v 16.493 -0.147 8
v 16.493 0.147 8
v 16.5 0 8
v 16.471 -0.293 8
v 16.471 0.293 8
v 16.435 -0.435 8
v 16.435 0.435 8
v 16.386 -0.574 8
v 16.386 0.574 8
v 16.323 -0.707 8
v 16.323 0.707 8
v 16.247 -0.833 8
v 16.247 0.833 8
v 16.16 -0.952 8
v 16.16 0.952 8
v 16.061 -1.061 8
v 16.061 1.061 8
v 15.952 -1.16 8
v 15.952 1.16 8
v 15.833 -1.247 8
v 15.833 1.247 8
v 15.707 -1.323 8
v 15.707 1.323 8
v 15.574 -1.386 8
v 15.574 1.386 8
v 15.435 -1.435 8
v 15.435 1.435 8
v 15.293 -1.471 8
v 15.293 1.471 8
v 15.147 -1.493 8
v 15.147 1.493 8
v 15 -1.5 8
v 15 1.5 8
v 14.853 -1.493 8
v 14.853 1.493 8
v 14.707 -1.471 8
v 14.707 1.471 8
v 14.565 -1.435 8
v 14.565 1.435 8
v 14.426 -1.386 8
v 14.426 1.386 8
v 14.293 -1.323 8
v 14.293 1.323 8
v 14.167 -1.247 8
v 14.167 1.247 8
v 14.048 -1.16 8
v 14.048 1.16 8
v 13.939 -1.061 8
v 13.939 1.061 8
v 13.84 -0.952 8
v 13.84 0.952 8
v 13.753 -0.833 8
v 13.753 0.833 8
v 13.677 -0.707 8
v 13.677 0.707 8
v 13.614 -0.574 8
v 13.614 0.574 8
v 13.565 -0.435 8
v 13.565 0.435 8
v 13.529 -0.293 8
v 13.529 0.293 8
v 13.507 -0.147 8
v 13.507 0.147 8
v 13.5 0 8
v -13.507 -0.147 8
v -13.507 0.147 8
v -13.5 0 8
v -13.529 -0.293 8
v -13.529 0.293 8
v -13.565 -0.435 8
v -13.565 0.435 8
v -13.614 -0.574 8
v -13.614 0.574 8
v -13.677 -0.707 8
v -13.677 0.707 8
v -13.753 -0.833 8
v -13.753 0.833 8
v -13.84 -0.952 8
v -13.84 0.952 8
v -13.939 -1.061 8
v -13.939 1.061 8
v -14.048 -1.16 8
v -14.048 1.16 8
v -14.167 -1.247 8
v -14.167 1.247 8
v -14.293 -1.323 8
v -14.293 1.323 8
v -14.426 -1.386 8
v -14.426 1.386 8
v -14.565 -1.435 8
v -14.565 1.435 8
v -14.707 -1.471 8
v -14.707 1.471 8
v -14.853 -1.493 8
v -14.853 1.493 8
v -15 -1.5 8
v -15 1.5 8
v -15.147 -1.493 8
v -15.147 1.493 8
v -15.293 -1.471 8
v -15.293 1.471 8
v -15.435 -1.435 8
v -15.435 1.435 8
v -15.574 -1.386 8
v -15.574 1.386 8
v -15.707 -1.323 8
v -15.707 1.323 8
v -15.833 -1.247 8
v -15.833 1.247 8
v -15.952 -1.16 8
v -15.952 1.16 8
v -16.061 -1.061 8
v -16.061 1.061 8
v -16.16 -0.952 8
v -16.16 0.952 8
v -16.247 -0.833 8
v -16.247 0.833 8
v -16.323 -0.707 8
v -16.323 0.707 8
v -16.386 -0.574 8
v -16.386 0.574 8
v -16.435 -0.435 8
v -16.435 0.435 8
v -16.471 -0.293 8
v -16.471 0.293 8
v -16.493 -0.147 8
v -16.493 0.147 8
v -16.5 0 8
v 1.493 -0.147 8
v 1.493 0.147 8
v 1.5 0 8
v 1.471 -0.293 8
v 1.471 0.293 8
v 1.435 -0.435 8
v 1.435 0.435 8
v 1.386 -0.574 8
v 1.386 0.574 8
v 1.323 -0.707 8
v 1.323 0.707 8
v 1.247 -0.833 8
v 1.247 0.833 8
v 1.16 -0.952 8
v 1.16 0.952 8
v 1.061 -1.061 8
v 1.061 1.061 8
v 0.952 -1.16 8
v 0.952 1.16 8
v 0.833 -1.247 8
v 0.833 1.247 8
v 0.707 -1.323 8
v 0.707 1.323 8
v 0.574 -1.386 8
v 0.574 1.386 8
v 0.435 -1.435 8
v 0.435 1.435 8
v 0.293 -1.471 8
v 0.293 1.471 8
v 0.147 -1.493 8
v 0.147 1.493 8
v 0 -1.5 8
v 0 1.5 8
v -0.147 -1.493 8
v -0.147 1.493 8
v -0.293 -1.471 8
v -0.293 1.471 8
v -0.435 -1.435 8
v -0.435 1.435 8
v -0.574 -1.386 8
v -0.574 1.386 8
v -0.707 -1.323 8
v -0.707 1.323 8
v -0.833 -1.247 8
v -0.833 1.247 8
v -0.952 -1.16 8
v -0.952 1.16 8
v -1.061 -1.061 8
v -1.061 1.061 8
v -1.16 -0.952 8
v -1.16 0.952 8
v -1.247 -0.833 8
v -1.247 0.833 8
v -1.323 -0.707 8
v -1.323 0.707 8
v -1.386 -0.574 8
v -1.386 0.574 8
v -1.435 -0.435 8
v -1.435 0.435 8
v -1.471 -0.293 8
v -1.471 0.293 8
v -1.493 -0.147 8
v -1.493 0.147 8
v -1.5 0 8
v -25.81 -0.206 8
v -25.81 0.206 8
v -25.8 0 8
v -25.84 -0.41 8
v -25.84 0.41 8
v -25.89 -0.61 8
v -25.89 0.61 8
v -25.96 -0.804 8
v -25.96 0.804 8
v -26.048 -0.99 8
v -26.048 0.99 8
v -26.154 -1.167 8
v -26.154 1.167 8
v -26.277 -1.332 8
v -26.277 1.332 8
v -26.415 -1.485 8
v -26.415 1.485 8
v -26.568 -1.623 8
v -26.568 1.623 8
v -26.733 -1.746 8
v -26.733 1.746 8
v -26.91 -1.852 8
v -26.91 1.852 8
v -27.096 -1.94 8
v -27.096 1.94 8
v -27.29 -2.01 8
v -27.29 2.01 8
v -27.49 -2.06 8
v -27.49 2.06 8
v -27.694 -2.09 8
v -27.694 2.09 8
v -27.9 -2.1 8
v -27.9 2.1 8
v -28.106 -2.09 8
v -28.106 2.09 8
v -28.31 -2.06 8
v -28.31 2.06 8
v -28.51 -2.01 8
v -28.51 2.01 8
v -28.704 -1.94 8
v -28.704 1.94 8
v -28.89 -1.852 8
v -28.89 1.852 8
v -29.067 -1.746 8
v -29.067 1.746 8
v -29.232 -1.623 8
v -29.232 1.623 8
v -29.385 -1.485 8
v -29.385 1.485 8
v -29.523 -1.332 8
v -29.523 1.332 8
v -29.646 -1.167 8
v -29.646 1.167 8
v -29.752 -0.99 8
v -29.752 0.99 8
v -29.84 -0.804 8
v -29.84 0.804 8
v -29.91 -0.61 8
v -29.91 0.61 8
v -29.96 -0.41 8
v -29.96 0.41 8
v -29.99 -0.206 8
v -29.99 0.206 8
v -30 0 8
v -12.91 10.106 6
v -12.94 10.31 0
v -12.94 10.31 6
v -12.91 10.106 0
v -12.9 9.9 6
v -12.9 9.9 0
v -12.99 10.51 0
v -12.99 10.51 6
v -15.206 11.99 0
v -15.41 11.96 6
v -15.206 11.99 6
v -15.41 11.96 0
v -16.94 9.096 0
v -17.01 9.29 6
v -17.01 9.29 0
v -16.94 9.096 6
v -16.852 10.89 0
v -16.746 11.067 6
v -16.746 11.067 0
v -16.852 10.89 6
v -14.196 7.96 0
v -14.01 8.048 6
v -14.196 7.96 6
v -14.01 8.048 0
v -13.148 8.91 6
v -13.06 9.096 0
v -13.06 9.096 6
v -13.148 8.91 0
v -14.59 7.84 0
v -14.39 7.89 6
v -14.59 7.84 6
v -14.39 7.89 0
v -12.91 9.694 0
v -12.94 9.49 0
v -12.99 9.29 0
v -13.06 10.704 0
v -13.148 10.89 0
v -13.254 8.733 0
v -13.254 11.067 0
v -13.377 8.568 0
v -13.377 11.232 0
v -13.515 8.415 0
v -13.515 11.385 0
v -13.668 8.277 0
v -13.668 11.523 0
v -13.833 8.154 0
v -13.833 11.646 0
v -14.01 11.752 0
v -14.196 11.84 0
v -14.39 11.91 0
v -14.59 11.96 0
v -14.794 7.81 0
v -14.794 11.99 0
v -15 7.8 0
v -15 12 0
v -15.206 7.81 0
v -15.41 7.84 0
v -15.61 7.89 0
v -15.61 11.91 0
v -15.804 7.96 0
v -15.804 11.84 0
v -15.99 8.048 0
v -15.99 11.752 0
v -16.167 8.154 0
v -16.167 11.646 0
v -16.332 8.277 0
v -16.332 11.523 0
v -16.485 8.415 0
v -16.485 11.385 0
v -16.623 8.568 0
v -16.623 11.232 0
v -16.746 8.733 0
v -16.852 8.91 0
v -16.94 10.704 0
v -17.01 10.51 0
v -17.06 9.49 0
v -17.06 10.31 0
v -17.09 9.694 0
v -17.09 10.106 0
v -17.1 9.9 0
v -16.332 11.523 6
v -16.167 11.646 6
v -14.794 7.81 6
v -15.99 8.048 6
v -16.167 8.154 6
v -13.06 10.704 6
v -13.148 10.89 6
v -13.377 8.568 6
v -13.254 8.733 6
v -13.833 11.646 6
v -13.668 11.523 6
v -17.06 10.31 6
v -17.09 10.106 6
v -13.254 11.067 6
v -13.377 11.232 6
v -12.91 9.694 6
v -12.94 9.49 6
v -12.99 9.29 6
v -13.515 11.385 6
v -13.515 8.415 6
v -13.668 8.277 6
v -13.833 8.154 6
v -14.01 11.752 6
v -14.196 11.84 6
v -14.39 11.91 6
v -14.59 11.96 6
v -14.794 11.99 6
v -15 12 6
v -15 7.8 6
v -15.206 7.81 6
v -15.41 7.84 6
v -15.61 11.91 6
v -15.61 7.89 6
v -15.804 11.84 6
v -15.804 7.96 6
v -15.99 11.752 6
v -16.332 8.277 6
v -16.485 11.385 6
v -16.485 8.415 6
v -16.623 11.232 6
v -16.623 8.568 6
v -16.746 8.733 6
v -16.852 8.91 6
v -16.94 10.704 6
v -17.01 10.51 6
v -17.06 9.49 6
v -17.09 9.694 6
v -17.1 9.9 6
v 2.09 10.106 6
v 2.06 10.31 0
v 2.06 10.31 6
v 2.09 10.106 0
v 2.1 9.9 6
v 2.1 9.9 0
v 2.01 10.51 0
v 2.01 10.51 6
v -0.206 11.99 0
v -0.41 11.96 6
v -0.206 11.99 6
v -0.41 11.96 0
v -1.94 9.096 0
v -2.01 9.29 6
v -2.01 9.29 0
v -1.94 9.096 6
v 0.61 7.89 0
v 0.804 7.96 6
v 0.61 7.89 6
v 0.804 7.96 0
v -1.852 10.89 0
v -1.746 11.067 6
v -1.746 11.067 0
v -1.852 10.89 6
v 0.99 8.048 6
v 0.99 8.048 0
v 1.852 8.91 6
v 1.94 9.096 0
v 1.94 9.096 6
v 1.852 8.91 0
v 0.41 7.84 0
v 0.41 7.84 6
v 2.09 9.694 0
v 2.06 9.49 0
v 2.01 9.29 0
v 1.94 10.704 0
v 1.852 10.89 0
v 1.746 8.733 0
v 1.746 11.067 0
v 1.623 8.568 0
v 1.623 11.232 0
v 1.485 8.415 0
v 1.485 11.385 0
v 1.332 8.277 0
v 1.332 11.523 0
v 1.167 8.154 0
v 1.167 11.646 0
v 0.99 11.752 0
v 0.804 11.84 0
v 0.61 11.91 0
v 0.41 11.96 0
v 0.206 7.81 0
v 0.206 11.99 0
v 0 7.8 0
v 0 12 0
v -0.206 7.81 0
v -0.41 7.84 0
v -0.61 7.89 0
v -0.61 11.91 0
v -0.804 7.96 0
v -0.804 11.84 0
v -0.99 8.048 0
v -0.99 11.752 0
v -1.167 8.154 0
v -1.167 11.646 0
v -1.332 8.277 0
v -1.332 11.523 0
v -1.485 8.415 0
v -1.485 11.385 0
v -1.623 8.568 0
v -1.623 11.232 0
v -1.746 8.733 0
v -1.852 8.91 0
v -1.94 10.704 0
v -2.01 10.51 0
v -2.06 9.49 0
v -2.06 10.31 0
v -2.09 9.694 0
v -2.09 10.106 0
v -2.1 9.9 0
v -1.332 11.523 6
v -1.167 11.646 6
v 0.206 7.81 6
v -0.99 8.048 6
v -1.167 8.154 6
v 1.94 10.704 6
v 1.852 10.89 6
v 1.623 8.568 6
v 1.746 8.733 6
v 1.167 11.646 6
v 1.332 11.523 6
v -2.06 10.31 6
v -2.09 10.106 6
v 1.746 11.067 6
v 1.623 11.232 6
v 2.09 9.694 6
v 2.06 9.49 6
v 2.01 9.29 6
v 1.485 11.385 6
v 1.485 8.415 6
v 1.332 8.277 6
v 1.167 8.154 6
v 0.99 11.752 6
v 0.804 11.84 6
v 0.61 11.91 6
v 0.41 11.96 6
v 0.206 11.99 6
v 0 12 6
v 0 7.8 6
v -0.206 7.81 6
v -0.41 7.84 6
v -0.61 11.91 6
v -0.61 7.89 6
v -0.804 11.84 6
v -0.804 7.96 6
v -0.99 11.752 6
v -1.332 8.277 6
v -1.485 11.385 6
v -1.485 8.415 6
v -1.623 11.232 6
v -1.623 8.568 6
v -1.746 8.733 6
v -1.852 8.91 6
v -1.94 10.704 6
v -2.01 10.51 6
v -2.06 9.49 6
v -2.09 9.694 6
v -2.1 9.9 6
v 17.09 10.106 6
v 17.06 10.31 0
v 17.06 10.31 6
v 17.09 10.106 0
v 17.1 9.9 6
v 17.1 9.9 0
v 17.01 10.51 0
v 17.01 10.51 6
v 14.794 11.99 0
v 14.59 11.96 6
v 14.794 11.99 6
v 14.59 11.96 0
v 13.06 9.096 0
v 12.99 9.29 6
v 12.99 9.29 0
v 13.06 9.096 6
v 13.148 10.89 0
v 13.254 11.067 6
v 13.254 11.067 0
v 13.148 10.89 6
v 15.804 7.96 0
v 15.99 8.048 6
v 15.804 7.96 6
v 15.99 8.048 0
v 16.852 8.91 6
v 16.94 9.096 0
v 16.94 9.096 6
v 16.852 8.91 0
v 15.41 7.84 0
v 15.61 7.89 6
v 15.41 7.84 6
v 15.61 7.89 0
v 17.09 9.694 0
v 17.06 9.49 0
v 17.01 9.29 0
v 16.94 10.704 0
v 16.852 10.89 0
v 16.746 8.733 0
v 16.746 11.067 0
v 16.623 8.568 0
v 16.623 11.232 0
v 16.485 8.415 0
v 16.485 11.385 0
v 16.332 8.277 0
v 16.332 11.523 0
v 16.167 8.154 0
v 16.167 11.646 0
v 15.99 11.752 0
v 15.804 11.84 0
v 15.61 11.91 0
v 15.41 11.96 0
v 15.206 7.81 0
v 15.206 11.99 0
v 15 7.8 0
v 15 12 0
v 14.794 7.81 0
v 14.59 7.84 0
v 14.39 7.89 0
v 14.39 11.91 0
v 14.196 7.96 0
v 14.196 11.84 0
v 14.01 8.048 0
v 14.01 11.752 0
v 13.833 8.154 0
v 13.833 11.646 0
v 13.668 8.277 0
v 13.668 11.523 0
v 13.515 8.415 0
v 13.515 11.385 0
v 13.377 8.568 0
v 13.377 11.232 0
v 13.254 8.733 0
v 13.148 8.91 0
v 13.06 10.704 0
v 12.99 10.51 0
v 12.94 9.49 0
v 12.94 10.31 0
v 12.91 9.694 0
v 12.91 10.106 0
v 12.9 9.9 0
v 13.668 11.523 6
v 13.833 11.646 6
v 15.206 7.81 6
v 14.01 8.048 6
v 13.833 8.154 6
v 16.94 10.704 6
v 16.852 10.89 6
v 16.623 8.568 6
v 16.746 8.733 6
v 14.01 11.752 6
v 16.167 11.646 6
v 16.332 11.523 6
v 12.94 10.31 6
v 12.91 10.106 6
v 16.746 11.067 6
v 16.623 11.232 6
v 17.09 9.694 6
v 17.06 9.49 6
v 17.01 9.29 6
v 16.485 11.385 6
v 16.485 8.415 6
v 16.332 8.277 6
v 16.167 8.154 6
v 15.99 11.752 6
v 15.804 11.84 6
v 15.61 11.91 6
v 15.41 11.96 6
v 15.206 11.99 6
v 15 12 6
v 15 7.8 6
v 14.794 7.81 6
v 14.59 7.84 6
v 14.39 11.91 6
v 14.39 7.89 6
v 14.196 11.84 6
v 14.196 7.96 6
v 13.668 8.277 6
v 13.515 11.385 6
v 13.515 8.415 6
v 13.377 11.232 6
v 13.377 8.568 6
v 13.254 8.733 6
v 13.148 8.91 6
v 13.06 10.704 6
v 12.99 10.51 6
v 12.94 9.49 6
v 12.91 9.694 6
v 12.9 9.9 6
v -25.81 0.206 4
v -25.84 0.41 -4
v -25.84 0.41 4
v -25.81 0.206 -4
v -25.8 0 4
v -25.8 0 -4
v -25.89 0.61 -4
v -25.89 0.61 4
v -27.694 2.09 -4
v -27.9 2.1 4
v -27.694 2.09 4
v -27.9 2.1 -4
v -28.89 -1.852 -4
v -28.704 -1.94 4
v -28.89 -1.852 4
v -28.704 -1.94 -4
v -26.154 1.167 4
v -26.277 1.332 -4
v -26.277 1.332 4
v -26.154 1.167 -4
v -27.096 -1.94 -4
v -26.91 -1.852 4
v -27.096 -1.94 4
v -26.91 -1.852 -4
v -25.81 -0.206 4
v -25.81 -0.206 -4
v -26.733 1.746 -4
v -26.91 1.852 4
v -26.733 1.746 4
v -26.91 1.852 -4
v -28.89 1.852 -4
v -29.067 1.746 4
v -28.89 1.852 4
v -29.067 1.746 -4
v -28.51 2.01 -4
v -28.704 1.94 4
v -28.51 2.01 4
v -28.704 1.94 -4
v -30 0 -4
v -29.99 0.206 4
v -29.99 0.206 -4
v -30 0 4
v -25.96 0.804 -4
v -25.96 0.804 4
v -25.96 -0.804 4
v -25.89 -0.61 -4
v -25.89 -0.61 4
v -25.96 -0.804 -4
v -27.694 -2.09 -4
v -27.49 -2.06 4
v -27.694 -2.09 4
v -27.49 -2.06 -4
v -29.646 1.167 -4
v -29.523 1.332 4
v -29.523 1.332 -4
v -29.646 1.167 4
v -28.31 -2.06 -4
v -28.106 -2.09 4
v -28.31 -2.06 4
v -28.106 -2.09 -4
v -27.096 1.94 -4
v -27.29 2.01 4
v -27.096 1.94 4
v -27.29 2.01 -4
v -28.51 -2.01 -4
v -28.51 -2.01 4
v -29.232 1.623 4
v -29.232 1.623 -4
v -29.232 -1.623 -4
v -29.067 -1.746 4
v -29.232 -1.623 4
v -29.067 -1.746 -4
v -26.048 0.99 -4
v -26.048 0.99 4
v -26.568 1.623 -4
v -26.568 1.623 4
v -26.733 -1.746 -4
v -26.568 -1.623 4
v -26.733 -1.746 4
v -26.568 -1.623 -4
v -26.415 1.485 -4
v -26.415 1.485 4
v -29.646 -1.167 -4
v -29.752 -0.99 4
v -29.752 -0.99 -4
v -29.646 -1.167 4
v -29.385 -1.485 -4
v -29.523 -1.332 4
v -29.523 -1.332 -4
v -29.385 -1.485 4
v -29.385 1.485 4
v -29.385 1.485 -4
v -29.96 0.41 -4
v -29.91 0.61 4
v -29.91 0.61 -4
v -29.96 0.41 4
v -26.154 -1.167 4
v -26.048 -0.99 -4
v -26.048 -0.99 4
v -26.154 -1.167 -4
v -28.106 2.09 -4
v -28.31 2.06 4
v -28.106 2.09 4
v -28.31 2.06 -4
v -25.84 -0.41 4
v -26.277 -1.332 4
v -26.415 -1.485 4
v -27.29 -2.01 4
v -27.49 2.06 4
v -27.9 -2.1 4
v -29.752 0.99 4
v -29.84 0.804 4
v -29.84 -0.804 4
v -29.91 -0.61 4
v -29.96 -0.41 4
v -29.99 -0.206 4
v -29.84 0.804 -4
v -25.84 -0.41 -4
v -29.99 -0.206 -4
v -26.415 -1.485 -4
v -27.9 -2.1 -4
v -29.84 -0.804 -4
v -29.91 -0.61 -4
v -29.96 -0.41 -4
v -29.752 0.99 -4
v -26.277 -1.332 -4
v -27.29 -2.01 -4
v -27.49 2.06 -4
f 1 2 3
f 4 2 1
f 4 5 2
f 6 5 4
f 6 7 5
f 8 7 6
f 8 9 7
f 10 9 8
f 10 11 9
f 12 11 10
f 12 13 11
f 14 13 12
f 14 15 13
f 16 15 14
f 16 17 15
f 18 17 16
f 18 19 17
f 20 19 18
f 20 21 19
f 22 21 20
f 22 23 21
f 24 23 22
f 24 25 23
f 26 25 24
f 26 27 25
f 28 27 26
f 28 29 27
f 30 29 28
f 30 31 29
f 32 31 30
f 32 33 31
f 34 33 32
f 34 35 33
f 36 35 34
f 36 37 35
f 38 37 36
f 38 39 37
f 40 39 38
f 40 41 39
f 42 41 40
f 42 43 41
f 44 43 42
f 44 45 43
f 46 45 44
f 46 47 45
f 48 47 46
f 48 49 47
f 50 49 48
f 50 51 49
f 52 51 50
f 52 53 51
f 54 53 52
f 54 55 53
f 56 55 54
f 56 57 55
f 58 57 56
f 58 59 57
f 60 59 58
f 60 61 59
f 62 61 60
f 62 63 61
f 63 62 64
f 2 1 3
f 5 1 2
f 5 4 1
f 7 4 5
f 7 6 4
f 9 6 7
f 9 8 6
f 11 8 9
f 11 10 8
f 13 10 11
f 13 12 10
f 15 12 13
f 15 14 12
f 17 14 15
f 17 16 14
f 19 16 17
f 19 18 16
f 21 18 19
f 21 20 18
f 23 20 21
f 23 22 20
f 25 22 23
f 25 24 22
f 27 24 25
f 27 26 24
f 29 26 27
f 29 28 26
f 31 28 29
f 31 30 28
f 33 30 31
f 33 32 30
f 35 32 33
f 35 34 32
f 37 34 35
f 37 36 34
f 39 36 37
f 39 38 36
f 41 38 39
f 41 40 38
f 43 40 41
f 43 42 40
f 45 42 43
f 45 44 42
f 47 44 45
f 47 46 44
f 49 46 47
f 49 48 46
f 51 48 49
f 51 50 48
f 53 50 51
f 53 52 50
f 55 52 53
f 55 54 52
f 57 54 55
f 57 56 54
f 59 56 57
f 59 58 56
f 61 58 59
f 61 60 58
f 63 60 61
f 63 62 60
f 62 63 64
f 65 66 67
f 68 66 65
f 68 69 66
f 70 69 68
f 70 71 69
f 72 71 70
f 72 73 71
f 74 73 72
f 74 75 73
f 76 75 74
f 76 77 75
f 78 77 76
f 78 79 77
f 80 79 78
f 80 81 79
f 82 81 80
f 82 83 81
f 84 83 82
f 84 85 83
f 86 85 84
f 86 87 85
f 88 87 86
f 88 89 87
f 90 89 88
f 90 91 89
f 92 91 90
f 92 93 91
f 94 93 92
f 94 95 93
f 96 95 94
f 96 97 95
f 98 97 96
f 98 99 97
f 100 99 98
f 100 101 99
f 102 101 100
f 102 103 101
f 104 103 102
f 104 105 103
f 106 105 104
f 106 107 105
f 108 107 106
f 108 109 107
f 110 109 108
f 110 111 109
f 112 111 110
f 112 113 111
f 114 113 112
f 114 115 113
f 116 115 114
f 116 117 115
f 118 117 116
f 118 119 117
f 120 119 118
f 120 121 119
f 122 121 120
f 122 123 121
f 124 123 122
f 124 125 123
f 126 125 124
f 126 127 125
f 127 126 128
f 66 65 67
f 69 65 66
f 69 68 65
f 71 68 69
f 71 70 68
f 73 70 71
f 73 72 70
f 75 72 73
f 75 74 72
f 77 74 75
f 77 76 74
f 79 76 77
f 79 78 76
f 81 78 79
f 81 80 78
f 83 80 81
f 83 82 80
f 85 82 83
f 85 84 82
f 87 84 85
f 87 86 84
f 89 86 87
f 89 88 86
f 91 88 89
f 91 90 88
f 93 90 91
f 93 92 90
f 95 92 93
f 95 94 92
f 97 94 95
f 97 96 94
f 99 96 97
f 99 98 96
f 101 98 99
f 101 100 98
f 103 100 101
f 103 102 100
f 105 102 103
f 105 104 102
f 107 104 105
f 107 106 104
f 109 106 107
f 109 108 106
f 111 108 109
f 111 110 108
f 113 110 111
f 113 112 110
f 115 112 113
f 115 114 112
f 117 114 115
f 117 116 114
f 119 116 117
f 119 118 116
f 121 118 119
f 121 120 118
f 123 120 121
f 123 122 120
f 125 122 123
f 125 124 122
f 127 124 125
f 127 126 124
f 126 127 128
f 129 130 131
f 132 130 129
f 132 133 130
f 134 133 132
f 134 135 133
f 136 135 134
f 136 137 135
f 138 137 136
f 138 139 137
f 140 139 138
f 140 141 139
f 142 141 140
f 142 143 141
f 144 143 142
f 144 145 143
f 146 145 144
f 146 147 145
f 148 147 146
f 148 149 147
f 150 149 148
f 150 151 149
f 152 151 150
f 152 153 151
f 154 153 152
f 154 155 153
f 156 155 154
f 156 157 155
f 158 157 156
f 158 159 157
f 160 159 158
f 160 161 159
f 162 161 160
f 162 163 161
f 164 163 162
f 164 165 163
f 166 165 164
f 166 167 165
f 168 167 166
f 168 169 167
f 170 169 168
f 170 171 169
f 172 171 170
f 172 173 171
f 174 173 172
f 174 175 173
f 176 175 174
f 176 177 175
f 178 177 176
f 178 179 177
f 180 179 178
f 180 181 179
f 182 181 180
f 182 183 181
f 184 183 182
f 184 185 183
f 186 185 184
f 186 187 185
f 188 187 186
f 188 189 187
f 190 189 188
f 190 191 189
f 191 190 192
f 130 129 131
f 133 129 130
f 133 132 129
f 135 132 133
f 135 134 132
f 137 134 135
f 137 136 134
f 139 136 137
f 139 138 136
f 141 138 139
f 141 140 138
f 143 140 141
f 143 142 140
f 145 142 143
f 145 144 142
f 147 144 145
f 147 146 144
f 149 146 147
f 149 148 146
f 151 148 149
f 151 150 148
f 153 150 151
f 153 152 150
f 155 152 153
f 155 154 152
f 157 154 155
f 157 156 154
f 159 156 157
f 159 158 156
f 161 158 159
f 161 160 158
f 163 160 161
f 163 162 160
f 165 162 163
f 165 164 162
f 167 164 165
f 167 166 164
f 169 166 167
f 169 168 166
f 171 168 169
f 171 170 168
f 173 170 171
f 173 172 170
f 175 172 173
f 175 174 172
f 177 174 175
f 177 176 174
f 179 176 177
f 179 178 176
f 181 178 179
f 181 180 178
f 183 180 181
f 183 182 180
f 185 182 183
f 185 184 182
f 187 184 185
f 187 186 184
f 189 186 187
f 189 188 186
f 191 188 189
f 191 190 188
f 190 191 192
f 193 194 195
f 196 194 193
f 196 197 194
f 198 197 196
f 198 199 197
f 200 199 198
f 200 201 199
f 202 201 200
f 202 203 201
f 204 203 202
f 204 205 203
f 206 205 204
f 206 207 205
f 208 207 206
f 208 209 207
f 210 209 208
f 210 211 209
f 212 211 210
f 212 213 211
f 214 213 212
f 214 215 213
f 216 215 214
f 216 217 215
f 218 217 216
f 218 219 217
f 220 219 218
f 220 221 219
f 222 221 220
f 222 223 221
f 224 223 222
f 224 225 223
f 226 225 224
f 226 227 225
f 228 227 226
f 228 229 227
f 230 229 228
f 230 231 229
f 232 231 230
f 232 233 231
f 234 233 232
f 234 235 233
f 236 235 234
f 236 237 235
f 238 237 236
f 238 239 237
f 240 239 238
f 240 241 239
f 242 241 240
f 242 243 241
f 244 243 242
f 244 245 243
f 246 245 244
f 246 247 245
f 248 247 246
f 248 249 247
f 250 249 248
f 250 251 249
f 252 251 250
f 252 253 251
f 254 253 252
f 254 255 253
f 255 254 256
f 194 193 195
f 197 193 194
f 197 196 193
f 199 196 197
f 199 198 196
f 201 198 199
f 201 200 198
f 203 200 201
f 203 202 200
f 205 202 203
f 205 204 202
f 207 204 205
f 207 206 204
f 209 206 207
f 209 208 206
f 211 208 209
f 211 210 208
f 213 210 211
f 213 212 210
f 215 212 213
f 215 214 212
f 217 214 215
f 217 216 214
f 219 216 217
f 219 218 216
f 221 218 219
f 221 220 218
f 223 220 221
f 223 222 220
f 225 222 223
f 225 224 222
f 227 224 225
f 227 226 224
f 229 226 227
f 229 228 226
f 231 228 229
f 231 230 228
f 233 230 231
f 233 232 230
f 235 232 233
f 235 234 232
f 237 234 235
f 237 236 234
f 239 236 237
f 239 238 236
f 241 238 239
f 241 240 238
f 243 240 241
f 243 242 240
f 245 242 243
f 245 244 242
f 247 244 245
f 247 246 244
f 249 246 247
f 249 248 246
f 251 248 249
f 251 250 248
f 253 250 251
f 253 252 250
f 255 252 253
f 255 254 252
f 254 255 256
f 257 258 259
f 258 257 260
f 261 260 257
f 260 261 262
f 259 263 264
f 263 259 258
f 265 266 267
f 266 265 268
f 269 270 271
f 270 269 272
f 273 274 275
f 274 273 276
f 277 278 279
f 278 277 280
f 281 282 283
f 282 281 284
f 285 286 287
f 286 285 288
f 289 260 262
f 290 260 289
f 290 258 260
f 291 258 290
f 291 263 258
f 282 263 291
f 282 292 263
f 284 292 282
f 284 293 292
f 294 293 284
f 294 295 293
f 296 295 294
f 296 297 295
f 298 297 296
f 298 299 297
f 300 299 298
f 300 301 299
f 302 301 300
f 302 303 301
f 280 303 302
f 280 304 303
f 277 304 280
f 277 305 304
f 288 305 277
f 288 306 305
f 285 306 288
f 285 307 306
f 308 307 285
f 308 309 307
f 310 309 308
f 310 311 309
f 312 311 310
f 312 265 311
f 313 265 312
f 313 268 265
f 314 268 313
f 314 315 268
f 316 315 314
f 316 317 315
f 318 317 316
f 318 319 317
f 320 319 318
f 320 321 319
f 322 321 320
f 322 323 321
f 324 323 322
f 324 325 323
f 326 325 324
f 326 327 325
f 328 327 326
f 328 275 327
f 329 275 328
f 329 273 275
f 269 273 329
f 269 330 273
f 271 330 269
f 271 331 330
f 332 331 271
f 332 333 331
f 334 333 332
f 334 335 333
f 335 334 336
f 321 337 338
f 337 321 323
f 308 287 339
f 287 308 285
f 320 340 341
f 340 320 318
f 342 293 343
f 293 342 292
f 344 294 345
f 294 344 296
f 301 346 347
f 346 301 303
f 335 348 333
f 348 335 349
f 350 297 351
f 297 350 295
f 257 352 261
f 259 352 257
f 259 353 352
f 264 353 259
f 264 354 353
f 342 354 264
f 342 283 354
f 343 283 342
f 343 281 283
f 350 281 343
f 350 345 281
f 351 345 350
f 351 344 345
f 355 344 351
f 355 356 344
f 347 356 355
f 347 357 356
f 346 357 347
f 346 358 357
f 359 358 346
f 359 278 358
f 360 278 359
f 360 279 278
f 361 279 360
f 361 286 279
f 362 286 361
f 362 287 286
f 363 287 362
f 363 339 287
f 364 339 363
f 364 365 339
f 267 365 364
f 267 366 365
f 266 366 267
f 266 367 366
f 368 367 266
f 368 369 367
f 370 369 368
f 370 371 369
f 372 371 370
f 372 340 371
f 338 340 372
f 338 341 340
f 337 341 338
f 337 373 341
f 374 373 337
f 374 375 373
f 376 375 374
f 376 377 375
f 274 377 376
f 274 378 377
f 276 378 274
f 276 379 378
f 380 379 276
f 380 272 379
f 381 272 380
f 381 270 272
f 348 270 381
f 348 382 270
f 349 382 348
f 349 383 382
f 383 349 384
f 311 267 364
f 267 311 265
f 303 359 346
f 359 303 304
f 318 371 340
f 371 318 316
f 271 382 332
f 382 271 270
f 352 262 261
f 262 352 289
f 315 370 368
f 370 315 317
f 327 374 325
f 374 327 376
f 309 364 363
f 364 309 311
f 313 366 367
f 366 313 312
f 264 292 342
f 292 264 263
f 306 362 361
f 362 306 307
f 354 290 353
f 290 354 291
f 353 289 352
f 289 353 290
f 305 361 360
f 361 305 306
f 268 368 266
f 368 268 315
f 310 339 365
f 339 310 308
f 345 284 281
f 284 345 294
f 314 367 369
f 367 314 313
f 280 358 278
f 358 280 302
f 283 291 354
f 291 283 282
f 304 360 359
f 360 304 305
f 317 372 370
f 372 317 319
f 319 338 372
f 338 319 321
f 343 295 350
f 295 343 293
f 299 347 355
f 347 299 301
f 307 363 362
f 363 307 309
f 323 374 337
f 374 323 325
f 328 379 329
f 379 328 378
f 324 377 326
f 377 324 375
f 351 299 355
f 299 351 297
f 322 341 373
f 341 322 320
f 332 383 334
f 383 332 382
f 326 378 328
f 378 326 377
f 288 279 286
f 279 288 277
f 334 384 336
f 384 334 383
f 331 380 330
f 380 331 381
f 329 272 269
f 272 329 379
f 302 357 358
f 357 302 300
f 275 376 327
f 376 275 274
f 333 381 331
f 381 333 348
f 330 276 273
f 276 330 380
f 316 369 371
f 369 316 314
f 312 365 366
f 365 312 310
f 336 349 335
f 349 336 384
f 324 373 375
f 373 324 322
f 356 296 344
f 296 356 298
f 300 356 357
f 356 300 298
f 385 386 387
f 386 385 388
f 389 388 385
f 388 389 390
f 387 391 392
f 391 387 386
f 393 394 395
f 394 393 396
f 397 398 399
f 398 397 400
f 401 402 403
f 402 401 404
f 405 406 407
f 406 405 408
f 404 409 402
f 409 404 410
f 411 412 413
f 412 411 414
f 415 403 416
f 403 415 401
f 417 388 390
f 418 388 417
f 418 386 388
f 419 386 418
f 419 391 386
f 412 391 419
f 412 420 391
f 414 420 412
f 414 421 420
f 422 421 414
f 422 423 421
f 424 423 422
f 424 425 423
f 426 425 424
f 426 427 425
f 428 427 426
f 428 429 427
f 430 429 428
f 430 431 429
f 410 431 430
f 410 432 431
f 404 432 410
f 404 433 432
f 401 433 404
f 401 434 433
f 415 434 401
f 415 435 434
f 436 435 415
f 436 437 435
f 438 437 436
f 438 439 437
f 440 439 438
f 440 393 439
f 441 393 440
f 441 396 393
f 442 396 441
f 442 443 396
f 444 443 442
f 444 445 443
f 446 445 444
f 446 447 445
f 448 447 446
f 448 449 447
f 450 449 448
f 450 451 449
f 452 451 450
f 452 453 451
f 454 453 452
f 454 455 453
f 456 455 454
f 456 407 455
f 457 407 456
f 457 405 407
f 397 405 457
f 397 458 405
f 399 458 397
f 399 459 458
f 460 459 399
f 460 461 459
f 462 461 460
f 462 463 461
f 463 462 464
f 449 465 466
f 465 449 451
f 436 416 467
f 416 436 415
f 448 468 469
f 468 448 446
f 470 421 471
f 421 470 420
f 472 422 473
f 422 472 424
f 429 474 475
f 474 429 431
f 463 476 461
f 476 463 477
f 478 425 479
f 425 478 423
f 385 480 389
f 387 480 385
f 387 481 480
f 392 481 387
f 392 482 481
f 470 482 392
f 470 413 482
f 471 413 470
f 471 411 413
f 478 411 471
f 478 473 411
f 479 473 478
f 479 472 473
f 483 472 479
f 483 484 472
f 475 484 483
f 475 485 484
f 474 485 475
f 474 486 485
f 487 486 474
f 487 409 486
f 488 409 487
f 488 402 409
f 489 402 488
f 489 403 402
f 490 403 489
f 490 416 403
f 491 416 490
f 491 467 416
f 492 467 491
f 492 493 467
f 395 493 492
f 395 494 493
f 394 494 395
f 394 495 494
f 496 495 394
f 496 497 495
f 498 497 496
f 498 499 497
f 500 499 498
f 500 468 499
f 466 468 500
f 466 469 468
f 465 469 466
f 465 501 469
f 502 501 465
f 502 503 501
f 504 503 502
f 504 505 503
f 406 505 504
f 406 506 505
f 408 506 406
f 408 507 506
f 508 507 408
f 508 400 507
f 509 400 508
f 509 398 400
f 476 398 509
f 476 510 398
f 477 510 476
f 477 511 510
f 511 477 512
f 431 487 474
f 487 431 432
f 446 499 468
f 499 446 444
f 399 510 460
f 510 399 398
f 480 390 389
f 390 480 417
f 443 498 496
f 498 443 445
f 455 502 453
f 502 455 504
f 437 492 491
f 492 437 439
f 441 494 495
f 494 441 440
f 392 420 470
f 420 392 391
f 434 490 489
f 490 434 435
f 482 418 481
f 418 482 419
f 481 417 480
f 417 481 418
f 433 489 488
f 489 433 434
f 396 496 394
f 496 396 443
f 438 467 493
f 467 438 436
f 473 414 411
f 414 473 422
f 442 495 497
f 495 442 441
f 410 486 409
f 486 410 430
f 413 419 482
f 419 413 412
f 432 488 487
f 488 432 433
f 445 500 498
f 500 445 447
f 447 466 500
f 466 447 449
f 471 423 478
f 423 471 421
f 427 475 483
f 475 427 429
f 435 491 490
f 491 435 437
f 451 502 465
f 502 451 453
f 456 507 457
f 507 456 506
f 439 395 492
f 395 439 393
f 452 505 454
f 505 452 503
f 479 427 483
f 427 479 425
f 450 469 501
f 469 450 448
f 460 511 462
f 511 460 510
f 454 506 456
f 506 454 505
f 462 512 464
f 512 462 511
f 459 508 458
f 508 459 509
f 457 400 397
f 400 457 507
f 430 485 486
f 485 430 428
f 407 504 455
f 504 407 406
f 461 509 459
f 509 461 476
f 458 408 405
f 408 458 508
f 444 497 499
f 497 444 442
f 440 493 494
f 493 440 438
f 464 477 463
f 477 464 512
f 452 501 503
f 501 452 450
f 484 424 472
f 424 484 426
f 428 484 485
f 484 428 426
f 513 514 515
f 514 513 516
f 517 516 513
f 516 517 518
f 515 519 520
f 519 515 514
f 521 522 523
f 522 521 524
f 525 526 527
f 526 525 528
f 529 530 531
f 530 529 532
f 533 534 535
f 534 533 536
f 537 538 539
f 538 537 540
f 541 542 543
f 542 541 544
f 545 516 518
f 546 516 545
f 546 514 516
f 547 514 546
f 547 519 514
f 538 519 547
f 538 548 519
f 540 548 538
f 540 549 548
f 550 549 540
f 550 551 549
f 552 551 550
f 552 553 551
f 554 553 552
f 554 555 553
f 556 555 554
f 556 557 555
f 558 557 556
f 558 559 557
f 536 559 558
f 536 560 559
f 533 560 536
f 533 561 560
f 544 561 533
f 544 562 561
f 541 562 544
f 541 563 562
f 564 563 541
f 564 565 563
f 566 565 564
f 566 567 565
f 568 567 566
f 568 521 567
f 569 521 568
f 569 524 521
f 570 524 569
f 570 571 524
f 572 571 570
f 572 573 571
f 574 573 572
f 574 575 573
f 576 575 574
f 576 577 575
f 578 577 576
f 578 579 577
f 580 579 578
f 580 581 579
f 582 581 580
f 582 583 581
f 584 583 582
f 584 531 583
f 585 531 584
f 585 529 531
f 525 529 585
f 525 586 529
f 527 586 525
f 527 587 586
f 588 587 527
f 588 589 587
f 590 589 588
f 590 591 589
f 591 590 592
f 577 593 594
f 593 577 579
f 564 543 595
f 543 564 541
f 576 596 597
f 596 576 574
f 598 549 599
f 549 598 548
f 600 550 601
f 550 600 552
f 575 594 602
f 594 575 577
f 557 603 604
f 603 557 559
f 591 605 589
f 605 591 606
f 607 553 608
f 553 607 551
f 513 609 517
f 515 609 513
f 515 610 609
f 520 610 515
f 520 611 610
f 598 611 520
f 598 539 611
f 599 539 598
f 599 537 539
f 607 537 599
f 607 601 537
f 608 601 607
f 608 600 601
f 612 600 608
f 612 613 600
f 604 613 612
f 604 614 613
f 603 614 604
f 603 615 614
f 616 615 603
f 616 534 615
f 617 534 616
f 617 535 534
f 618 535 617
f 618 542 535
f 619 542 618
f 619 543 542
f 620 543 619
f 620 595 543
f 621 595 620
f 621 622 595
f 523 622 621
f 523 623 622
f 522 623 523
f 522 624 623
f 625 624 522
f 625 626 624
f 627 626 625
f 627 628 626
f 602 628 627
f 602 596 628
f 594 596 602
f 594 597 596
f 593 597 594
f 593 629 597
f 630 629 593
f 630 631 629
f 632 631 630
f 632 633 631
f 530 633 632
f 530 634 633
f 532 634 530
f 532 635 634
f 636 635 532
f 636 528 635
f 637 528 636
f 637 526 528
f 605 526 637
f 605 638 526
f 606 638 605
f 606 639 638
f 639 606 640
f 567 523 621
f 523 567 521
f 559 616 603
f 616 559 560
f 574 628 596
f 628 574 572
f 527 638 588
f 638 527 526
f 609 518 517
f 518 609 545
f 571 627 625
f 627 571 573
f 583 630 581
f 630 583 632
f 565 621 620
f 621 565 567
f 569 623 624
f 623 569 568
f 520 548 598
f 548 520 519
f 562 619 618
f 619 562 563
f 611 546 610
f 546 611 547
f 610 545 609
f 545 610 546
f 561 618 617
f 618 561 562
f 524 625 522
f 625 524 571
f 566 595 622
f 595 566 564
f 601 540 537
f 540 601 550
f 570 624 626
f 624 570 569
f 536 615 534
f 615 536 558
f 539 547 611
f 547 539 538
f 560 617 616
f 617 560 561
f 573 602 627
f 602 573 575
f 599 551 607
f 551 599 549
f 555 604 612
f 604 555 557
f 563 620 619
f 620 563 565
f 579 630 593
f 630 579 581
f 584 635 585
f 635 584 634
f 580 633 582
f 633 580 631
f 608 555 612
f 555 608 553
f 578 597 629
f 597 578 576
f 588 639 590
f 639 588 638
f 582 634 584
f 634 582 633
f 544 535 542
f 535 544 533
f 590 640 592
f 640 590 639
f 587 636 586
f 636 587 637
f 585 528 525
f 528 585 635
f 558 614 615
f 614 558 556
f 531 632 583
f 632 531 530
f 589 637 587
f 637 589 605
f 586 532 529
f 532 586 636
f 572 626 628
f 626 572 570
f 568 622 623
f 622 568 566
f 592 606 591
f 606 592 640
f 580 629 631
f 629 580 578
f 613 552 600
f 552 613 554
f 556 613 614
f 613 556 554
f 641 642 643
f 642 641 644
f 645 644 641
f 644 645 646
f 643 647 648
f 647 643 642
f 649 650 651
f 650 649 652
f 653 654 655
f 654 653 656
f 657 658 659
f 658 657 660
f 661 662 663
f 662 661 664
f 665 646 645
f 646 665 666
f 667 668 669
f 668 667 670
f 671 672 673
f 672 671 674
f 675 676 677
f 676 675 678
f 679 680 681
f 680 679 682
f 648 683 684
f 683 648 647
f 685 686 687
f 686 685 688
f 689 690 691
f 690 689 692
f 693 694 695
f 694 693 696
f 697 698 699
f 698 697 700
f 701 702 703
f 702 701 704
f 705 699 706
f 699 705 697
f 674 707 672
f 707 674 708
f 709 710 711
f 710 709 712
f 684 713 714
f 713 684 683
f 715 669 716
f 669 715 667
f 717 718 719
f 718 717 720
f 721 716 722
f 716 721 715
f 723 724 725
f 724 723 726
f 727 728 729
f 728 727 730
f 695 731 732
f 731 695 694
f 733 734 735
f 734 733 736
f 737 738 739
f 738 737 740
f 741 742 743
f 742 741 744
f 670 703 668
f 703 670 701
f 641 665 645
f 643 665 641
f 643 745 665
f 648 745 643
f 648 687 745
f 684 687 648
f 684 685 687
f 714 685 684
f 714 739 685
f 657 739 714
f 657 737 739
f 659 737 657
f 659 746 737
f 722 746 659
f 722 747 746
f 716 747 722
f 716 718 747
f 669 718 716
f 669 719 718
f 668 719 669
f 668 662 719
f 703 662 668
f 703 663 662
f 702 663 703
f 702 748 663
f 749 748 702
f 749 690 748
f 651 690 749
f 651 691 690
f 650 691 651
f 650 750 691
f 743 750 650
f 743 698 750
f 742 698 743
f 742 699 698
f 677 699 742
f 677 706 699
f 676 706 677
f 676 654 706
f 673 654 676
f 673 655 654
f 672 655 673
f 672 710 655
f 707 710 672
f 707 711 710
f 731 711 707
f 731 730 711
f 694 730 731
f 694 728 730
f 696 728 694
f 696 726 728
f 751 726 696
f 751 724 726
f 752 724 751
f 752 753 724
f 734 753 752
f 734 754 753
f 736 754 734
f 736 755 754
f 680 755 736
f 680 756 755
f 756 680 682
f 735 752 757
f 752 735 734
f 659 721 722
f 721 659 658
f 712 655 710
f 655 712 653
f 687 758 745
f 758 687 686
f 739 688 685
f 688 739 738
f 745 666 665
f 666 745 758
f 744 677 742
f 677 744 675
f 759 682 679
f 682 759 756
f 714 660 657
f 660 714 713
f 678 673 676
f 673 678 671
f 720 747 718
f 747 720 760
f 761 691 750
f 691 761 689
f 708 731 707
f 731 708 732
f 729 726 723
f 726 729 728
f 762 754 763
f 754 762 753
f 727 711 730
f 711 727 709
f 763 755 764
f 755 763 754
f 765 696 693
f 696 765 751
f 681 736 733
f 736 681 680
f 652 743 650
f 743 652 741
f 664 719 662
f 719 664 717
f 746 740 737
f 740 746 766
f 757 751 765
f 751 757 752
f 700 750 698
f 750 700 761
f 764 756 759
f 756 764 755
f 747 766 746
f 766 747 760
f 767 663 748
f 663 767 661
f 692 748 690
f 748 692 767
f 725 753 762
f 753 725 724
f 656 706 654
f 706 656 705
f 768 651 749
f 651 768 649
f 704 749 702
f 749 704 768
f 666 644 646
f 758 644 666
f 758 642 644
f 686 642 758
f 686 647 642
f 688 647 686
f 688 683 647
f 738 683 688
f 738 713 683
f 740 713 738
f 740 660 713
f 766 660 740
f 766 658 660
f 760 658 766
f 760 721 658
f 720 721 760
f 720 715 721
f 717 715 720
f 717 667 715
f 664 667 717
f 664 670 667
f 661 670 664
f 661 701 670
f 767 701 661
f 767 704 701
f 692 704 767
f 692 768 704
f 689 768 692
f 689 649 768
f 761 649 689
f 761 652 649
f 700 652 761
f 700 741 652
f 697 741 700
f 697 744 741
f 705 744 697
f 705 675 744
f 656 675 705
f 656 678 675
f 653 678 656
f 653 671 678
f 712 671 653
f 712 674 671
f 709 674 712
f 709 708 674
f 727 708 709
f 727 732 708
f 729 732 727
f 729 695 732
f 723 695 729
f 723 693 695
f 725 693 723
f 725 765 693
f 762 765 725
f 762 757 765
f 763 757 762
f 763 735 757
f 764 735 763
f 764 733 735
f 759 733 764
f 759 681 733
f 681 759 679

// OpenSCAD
// --- Dimensions (mm) ---

// Block dimensions
block_length = 60;   // X dimension
block_width = 24;    // Y dimension
block_height = 16;   // Z dimension

// Tubing/Channel dimensions
tube_diameter = 3.0;  // Diameter of internal channels
inlet_socket_dia = 4.2; // Inlet socket diameter
outlet_socket_dia = 4.2; // Outlet socket diameter
inlet_depth = 8.0;    // Depth of inlet socket
outlet_depth = 6.0;   // Depth of outlet sockets

// Screw hole dimensions
screw_hole_diameter = 3.4; // Diameter for M3 screws
screw_hole_offset_x1 = -25; // X position of first screw hole (relative to center)
screw_hole_offset_x2 = 25;  // X position of second screw hole (relative to center)
screw_hole_y_pos = -6.0;    // Y position of both screw holes

// Channel positions and lengths
main_channel_stop_x = 15; // Where the main channel stops internally
outlet_branch_x1 = -15;  // X position for first outlet branch
outlet_branch_x2 = 0;    // X position for second outlet branch
outlet_branch_x3 = 15;   // X position for third outlet branch

// --- Constants ---
$fn = 64; // High resolution for curves

// --- Base Block ---
module block() {
    cube([block_length, block_width, block_height], center = true);
}

// --- Features ---

// 1. Inlet Socket (on -X face, y=0)
module inlet_socket() {
    // Positioned at the -X end face (-block_length/2). Y=0 is correct. Z centered.
    translate([-block_length/2 + (inlet_socket_dia / 2), 0, 0]) {
        cylinder(h = inlet_depth, r = inlet_socket_dia / 2, center = true);
    }
}

// 2. Outlet Sockets (on +Y face)
module outlet_socket() {
    // Socket centered at the branch X position, on the Y face (+block_width/2). Z centered.
    translate([0, block_width/2 - (outlet_socket_dia / 2), 0]) {
        cylinder(h = outlet_depth, r = outlet_socket_dia / 2, center = true);
    }
}

// 3. Internal Channels (Hollowed out)
module internal_channels() {
    difference() {
        // Start with the solid block shape for subtraction reference
        block();

        // A. Main Channel (Runs from inlet area towards X=15, closed inside)
        // Inlet is at -X face. The channel starts near there and runs to x = main_channel_stop_x.
        // Length needed: (main_channel_stop_x) + distance from center to inlet start point.
        // Since the inlet socket takes up space, we ensure the cylinder covers the required length starting from the block's center line towards X=15.
        translate([-(block_length/2 - (inlet_socket_dia / 2)), 0, block_height/2]) {
            // Total length needed: distance from inlet start point to main channel stop point + buffer for inlet socket overlap
            cylinder(h = main_channel_stop_x + (block_length/2 - (inlet_socket_dia / 2)) , r = tube_diameter / 2);
        }

        // B. Outlet Channels (Branching from X=-15, 0, 15 towards +Y face)
        for (i = [outlet_branch_x1, outlet_branch_x2, outlet_branch_x3]) {
            translate([i, 0, block_height/2]) {
                // Length needed: from center line (Y=0) to exit face (Y=block_width/2). Add tube radius for clean cut.
                cylinder(h = block_width / 2 + tube_diameter/2 , r = tube_diameter / 2);
            }
        }

        // C. Closing the Main Channel at X=15 (to ensure it's closed inside)
        // This cuts a cap at x = main_channel_stop_x, centered on Y=0, Z=8.
        translate([main_channel_stop_x + block_length/2, 0, block_height/2]) {
            cylinder(h = tube_diameter * 2, r = tube_diameter / 2);
        }

        // D. Inlet Connection Cutout (To allow tubing entry)
        translate([-block_length/2 + (inlet_socket_dia / 2), 0, block_height/2]) {
            cylinder(h = block_height * 2, r = inlet_socket_dia / 2);
        }

    }
}


// 4. Screw Holes (Vertical through-holes)
module screw_holes() {
    for (i = [screw_hole_offset_x1, screw_hole_offset_x2]) {
        translate([i, screw_hole_y_pos, -block_height/2 - 0.01]) { // Extend slightly past bottom face
            cylinder(h = block_height + 0.02, r = screw_hole_diameter / 2);
        }
    }
}


// --- Final Assembly ---

// The structure must be: (Block - Internal Cuts) U External Sockets
difference() {
    // 1. Base Block minus internal features
    block();
    union() {
        internal_channels();
        screw_holes();
    }
}
union() {
    // 2. Add external sockets back onto the resulting shape
    inlet_socket();

    // Outlet sockets (must be translated correctly to align with block center)
    for (i = [outlet_branch_x1, outlet_branch_x2, outlet_branch_x3]) {
        translate([i, 0, 0]) { // Translate the socket cylinder so its base is at Z=0
            // We need to position it on the +Y face (block_width/2) and centered in X.
            // Since we are unioning onto the result of the difference, we place the socket relative to the origin.
            translate([0, block_width/2 - (outlet_socket_dia / 2), 0]) {
                cylinder(h = outlet_depth, r = outlet_socket_dia / 2);
            }
        }
    }
}
